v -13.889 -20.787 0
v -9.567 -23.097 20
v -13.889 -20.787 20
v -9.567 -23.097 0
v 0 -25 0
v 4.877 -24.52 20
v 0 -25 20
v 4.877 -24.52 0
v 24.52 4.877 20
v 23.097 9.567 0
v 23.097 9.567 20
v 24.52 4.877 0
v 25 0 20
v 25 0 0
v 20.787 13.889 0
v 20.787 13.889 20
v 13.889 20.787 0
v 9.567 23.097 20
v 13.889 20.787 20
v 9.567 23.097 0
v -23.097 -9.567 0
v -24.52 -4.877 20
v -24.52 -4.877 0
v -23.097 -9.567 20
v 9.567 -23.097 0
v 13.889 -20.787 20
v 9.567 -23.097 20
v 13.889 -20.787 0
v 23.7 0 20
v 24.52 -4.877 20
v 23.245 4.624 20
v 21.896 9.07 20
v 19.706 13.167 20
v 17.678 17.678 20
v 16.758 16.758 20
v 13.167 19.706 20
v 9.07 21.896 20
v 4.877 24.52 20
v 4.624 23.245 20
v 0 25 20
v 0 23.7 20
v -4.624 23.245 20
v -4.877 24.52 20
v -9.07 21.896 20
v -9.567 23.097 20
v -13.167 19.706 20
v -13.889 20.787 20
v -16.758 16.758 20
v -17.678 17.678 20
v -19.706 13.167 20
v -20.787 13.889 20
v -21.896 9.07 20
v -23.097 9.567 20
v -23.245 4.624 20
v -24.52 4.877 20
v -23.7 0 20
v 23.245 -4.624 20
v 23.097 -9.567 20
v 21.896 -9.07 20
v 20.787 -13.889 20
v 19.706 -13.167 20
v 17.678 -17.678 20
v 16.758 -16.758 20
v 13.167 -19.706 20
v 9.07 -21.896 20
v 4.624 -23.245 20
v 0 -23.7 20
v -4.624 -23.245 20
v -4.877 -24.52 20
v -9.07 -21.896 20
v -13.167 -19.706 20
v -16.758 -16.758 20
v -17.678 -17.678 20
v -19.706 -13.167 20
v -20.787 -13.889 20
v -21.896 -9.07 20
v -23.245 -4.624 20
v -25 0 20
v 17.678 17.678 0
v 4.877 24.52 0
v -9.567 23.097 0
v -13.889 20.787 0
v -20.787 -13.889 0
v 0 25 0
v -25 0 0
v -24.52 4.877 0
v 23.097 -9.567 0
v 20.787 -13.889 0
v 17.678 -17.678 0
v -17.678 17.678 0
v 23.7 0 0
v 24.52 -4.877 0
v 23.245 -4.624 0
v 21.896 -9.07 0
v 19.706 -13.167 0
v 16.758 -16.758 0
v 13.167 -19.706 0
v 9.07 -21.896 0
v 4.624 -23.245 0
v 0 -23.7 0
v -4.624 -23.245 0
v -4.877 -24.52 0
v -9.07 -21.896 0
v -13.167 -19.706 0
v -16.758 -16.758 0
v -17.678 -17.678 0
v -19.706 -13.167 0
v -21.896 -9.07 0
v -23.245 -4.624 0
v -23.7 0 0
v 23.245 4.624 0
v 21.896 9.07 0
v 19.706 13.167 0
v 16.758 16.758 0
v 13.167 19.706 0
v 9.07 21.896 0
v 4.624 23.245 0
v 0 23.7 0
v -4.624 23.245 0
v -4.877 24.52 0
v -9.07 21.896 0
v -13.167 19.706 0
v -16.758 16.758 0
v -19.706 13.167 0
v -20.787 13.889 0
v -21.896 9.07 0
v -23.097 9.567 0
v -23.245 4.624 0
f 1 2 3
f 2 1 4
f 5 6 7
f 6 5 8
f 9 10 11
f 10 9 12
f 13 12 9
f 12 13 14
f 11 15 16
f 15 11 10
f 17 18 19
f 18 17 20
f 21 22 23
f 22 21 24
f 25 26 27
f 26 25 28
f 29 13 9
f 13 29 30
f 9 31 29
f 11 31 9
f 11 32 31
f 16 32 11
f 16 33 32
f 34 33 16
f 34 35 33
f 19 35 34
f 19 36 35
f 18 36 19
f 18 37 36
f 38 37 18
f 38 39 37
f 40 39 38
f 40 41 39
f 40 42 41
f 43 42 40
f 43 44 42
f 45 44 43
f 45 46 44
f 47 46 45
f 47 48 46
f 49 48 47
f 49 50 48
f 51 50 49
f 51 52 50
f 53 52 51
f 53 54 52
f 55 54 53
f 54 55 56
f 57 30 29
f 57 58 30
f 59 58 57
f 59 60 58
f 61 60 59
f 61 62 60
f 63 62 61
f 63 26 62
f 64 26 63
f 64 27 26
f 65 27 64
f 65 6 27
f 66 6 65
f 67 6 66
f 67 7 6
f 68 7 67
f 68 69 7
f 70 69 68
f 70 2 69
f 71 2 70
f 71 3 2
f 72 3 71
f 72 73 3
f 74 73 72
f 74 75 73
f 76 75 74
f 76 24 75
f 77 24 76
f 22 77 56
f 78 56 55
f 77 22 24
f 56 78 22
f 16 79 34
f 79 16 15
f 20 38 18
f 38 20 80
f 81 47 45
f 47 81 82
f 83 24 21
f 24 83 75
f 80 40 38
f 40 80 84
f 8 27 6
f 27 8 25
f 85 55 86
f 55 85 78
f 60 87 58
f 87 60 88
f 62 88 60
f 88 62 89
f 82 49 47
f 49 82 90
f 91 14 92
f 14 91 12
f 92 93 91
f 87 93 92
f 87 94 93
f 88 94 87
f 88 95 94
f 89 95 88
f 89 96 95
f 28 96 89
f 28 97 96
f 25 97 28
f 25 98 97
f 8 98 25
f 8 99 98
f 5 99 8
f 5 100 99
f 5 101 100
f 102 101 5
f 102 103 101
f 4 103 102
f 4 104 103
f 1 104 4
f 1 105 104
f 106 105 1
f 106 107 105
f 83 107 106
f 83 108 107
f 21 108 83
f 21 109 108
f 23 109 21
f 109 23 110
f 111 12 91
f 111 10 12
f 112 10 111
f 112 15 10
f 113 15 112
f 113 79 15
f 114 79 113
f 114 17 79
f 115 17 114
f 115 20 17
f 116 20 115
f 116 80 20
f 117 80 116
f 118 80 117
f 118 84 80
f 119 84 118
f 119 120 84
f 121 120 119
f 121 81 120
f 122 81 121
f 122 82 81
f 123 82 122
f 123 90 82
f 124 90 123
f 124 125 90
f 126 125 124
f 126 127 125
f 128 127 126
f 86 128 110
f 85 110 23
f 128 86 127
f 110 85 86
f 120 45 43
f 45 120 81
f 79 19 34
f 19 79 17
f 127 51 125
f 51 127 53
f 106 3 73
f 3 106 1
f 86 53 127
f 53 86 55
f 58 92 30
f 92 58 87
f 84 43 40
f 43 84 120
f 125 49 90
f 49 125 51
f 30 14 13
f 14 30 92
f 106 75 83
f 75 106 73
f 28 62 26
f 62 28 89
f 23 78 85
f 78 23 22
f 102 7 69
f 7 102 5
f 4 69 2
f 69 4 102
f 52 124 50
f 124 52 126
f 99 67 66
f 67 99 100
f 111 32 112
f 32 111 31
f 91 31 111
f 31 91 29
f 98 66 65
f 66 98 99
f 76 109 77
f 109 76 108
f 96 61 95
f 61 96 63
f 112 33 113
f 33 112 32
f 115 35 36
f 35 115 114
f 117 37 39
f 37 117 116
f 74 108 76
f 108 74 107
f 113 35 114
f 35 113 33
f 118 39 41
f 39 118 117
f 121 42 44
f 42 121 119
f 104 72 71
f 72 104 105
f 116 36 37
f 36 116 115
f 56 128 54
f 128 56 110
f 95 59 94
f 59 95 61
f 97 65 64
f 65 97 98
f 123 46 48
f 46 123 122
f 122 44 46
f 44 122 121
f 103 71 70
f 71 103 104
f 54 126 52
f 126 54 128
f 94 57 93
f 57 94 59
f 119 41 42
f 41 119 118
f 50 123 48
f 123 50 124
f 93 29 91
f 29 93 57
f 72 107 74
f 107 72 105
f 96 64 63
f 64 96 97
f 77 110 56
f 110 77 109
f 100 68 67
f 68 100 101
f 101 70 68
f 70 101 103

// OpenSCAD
$fn = 32;

// ----------------------------------------------------------------------
// Thin tube: 1.3 mm wall
// ----------------------------------------------------------------------

// --- parameters (mm) ---
tube_od = 50;             // outer diameter
tube_h = 20;              // height, Z
wall = 1.3;               // wall thickness

difference() {
  cylinder(h = tube_h, d = tube_od);
  translate([0, 0, -1]) cylinder(h = tube_h + 2, d = tube_od - 2 * wall);
}
